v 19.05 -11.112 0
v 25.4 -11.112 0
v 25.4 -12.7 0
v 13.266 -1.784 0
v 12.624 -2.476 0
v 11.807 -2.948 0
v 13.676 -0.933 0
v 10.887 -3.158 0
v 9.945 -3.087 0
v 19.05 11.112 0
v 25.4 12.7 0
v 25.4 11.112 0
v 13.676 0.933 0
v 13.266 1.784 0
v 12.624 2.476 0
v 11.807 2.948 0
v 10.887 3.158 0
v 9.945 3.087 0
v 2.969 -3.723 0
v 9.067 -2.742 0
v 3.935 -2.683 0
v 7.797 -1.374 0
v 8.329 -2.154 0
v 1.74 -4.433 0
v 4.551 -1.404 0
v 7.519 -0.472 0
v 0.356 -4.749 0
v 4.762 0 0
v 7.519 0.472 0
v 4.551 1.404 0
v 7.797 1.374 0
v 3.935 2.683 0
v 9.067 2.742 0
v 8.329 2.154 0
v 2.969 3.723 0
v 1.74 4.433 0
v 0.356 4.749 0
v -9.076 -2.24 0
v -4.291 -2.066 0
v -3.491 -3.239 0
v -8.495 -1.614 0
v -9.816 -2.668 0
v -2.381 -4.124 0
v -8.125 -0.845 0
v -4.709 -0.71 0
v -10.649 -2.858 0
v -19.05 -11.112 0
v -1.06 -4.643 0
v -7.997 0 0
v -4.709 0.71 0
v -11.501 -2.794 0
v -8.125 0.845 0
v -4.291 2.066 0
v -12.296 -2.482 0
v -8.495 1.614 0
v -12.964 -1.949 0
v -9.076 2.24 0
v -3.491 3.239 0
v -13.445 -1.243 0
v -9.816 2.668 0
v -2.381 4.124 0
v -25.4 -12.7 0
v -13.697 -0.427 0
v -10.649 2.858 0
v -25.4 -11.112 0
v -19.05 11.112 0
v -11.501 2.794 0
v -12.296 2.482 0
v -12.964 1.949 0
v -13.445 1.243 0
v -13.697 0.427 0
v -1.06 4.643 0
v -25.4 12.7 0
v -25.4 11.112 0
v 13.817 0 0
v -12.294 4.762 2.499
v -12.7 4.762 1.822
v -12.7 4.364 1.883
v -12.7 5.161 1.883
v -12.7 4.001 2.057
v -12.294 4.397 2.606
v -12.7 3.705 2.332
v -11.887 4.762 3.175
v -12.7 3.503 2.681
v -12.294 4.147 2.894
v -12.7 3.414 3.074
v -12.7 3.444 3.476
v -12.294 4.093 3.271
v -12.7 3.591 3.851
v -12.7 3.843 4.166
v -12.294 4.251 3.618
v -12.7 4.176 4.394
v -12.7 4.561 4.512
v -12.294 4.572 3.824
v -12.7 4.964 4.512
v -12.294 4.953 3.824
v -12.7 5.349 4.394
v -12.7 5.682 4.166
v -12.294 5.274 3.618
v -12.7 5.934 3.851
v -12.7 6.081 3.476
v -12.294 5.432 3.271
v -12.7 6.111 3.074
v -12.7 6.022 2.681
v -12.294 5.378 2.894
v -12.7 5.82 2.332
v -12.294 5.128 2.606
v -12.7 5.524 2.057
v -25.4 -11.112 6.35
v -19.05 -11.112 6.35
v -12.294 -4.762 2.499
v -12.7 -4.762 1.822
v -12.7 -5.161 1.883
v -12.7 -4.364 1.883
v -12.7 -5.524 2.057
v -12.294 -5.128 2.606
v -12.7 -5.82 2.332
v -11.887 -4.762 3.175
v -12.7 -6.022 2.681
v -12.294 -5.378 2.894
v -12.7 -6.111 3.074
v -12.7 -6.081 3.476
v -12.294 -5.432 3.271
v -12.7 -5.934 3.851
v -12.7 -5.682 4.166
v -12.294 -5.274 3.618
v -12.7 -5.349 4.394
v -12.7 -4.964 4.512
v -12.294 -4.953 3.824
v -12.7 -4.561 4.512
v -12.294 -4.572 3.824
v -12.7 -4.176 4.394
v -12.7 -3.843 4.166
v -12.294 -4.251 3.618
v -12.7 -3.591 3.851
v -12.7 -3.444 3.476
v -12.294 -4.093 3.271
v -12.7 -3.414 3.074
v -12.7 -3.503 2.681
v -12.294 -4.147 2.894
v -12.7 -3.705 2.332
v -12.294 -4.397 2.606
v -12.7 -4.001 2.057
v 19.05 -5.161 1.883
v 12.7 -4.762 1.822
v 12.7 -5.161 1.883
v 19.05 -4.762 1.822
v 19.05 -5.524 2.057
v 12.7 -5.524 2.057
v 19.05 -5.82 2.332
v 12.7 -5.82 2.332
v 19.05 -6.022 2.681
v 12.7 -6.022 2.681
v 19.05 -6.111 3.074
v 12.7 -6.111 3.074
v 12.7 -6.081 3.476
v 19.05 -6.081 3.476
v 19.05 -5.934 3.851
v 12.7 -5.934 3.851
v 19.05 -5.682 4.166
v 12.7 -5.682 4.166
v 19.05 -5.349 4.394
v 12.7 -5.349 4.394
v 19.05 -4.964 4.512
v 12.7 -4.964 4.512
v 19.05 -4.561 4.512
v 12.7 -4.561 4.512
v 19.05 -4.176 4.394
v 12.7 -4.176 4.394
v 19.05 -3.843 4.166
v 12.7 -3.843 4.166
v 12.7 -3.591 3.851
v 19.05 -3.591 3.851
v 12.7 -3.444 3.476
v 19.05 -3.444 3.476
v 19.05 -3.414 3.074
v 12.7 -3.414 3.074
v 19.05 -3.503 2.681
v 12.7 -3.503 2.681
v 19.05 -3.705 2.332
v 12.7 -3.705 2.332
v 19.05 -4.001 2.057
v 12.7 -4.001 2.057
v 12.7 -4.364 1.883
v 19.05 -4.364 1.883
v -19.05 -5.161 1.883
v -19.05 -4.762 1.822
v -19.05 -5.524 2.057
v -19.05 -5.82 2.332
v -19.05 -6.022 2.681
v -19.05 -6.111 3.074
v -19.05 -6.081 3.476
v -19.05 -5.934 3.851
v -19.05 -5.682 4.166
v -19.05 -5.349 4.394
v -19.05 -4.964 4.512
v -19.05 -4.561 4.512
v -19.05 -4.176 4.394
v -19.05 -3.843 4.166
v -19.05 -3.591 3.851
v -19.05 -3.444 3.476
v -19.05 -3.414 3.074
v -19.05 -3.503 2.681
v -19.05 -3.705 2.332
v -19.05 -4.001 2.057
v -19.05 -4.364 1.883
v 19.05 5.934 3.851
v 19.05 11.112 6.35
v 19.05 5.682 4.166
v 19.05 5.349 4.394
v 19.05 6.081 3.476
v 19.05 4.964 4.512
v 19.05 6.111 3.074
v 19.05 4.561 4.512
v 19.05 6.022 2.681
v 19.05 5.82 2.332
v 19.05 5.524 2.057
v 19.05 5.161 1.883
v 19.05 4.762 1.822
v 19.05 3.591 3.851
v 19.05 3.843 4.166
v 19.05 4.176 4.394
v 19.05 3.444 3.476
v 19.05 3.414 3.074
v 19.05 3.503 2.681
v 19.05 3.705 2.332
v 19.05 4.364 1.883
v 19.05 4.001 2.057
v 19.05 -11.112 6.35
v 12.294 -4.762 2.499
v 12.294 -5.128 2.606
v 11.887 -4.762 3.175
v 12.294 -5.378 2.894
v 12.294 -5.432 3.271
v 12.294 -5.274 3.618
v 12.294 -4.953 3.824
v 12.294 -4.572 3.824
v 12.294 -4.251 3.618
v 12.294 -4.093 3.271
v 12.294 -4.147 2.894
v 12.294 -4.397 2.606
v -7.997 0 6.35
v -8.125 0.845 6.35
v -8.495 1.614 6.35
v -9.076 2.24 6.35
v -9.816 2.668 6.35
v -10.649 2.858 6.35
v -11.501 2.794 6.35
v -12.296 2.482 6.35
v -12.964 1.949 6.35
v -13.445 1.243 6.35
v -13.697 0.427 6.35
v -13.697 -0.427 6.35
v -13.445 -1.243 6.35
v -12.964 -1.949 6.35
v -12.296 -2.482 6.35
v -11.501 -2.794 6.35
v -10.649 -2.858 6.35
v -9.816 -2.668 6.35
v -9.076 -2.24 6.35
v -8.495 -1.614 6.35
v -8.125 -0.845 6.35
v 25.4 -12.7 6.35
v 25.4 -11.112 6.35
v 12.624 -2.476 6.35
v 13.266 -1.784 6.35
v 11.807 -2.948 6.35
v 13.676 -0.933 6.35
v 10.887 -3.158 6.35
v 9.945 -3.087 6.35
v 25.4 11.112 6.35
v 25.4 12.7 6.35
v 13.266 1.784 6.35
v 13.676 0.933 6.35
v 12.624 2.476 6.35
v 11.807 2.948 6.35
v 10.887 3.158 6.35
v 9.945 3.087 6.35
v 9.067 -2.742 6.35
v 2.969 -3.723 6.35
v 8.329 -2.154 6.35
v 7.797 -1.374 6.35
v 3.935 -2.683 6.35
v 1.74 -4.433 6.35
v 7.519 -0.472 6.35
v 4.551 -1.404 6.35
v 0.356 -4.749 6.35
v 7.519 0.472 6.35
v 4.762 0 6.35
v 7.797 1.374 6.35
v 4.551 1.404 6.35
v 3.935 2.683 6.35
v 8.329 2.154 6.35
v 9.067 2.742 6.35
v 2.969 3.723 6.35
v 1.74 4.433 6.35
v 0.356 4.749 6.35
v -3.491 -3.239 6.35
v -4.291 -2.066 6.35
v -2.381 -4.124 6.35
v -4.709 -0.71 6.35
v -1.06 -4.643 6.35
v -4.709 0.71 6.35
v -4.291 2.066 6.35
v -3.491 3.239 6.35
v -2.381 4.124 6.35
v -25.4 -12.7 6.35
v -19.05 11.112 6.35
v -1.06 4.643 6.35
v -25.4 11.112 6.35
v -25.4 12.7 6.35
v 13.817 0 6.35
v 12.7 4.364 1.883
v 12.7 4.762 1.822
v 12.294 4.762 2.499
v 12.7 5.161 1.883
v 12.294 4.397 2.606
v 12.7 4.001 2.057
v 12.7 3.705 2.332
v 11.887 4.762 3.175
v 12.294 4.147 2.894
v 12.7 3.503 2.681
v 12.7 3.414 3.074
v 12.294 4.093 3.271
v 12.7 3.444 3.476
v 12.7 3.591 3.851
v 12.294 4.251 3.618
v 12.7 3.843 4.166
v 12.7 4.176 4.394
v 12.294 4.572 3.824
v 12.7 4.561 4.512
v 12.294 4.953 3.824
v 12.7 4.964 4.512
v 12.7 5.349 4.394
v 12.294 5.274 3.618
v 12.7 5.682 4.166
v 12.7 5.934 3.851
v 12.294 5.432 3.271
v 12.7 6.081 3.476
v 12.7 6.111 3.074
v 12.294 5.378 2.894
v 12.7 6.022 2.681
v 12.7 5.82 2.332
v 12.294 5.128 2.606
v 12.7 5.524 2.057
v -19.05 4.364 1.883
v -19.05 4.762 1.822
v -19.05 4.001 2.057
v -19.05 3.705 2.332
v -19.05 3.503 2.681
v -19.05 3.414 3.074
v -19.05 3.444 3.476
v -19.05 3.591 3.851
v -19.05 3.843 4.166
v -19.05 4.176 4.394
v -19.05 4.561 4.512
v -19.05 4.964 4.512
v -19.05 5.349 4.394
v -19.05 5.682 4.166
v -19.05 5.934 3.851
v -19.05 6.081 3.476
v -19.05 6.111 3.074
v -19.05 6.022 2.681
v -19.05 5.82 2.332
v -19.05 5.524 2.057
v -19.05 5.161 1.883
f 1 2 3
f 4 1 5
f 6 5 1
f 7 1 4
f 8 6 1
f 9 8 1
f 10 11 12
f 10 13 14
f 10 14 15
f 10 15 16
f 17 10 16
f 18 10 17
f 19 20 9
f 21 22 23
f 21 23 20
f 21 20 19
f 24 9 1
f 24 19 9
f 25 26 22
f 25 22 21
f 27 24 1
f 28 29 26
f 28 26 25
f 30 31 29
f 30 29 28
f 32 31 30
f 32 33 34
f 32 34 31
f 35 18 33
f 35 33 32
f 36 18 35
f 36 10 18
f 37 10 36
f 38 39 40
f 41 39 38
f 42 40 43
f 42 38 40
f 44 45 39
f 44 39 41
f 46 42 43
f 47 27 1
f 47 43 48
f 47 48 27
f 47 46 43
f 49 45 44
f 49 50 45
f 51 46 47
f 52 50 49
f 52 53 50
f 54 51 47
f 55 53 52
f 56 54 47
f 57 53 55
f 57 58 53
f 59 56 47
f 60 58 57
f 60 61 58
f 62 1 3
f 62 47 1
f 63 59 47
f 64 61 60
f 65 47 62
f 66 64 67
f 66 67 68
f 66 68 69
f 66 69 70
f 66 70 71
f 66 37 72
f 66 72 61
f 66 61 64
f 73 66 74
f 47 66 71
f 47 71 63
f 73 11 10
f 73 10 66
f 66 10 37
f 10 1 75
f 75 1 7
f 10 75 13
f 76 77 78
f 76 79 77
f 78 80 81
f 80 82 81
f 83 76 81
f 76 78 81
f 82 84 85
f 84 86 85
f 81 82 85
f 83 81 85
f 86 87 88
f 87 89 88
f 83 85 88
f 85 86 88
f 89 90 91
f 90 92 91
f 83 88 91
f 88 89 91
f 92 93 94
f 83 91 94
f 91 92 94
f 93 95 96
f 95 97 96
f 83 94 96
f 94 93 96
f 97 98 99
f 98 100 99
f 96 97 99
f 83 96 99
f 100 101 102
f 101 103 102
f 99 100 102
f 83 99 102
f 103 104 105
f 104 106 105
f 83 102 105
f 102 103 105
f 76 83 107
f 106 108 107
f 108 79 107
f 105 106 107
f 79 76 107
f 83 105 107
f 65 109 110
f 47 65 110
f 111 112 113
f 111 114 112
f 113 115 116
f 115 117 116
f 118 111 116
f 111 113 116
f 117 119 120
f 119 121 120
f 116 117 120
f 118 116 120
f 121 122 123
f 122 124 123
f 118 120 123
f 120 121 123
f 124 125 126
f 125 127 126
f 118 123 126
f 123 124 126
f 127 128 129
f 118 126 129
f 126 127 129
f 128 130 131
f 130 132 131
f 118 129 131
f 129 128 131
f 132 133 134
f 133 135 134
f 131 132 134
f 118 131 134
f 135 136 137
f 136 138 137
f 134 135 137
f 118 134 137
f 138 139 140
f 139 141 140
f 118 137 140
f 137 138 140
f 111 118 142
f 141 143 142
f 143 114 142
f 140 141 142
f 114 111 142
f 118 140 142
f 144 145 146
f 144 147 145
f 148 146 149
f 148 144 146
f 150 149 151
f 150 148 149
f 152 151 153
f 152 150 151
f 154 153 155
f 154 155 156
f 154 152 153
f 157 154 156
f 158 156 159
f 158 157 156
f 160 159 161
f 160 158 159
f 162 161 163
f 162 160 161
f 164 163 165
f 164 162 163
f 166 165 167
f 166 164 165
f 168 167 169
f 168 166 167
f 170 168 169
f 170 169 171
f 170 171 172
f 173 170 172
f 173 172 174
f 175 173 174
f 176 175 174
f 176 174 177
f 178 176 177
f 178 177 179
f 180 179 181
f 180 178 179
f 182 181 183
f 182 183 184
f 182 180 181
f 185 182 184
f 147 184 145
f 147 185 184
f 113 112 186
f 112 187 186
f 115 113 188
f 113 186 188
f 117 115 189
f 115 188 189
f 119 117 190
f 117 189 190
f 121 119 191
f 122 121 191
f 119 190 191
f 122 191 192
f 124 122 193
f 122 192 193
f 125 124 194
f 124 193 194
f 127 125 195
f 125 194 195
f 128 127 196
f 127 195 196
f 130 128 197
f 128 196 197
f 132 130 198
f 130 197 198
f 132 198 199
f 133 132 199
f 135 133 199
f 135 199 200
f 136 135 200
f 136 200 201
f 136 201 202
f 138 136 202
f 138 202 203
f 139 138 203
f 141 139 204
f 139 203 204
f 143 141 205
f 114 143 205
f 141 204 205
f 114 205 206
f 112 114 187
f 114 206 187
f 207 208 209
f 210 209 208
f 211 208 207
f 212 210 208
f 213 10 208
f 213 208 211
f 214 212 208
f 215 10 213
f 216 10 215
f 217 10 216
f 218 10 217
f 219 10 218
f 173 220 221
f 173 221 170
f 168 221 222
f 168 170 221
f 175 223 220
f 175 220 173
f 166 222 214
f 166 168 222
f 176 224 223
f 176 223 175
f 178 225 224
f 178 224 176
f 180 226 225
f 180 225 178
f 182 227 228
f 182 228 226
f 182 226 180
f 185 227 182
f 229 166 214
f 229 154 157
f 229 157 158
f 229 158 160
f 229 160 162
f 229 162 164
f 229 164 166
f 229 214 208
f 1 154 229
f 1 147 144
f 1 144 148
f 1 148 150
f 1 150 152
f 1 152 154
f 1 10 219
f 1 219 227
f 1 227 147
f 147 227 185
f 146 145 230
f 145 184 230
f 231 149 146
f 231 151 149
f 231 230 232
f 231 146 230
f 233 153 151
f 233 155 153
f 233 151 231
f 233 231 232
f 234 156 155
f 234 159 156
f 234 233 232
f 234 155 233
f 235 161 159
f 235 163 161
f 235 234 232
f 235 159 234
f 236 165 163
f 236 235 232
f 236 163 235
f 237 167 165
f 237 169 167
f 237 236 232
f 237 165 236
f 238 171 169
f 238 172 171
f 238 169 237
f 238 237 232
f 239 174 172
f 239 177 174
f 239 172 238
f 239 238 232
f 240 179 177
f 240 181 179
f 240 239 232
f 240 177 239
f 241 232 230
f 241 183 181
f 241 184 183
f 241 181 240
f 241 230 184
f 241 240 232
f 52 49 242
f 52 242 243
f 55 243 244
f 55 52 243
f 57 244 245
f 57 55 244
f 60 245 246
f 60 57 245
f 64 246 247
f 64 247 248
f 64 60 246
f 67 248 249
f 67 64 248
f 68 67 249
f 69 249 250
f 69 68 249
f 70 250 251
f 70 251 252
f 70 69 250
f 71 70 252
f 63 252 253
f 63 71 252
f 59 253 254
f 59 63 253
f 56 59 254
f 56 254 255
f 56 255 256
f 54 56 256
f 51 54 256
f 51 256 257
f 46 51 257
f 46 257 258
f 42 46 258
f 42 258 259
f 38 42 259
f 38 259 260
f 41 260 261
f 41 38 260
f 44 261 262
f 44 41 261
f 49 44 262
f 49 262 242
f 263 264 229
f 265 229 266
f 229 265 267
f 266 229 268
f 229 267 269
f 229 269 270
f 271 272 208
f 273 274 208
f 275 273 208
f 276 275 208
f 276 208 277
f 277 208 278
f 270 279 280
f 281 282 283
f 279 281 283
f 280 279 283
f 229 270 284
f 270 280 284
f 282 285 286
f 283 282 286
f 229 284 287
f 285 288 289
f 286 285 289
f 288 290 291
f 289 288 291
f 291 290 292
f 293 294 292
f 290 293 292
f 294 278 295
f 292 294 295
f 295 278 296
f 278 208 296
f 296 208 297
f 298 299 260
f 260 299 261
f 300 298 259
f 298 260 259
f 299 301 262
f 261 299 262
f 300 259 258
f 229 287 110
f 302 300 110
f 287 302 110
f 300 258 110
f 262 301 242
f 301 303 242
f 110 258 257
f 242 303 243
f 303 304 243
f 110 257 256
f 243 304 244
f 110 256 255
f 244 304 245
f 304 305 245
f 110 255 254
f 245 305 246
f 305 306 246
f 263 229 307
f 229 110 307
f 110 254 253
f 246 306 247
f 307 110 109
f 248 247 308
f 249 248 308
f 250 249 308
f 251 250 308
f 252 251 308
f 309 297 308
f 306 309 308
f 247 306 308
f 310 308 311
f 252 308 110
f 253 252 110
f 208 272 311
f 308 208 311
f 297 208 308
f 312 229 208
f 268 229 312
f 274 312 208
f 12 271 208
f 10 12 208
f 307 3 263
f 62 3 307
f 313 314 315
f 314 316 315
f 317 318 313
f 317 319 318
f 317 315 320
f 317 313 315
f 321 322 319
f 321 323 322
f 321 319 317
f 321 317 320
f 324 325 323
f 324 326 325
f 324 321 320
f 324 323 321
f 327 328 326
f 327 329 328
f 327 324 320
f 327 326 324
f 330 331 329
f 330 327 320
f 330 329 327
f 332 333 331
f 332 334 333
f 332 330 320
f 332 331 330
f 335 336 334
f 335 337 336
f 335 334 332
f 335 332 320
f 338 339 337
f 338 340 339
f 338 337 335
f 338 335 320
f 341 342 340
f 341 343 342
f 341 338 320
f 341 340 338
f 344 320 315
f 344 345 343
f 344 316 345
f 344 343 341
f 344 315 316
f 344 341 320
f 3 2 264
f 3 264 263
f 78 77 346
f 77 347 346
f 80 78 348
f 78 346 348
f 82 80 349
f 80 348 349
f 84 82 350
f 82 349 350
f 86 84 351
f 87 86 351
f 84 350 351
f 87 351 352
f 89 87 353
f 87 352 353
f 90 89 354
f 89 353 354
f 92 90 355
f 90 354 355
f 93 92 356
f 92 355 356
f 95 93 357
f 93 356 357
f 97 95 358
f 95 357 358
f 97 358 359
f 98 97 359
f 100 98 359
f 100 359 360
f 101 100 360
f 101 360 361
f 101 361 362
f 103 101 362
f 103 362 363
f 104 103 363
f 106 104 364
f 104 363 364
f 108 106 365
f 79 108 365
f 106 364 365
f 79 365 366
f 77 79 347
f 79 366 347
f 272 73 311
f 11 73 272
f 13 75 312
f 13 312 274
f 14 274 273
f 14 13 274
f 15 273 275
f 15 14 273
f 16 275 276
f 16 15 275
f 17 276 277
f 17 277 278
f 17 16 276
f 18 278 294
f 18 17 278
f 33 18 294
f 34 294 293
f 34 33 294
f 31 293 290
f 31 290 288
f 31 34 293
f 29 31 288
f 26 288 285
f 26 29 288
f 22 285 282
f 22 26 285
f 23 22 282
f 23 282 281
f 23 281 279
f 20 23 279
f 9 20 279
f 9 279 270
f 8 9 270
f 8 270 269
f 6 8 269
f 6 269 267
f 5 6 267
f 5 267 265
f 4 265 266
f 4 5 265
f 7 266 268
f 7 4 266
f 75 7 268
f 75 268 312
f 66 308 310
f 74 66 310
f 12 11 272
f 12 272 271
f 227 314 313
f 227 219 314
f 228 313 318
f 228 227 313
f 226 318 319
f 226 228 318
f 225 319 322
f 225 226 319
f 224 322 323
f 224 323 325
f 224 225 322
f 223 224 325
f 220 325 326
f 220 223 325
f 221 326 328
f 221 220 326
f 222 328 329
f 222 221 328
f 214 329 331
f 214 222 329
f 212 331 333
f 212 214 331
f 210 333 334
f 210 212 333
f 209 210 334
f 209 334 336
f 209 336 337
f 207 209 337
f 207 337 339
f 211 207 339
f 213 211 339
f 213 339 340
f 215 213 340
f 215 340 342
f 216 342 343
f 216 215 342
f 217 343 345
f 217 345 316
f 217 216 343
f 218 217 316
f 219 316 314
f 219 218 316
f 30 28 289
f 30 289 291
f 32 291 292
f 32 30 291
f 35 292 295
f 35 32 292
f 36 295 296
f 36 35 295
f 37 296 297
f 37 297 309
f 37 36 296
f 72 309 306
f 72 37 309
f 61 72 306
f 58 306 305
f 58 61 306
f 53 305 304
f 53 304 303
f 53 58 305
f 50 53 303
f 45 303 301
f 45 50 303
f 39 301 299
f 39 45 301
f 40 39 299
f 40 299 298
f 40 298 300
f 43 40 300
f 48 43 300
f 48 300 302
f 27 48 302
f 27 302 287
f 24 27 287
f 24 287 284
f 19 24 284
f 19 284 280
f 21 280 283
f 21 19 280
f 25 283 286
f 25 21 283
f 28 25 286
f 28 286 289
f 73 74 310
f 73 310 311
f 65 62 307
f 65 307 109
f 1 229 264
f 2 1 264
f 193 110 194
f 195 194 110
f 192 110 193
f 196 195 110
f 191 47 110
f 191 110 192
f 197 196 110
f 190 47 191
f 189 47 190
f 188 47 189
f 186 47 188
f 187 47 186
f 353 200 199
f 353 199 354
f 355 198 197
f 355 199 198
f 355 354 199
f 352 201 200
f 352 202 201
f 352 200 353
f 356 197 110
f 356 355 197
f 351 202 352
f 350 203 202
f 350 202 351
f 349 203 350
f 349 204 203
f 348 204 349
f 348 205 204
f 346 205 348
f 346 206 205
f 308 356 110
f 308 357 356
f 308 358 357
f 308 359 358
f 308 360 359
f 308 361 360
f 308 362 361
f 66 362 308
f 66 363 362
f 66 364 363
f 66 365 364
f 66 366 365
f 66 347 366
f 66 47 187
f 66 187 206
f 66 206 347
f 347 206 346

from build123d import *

# Parameters (mm, degrees)
SKETCH1_R                          = 4.7625
SKETCH1_R_2                        = 2.86564839
SKETCH1_R_3                        = 3.16650189
BOSS_EXTRUDE1_DEPTH                = 6.35
TAP_DRILL_FOR_6_32_TAP1_AT_2_COUNT = 2
TAP_DRILL_FOR_6_32_TAP1_AT_2_PITCH = 9.525


with BuildPart() as part:
    # Sketch1 → Boss-Extrude1 (new body)
    with BuildSketch(Plane.XY):
        Polygon((25.4, -11.1125), (25.4, -12.7), (-25.4, -12.7), (-25.4, -11.1125), (-19.05, -11.1125), (-19.05, 11.1125), (-25.4, 11.1125), (-25.4, 12.7), (25.4, 12.7), (25.4, 11.1125), (19.05, 11.1125), (19.05, -11.1125), align=None)
        Circle(SKETCH1_R, mode=Mode.SUBTRACT)
        with Locations((-10.863100334, 0)):
            Circle(SKETCH1_R_2, mode=Mode.SUBTRACT)
        with Locations((10.650098366, 0)):
            Circle(SKETCH1_R_3, mode=Mode.SUBTRACT)
    extrude(amount=BOSS_EXTRUDE1_DEPTH)

    # Sketch4 → Tap Drill for #6-32 Tap1 (revolve, cut)
    with BuildSketch(Plane(origin=(19.05, 4.7625, 3.175), x_dir=(0, 0, -1), z_dir=(0, 1, 0))):
        Polygon((0, 0), (0, 7.16269403), (1.35255, 6.35), (1.35255, 0), align=None)
    tap_drill_for_6_32_tap1 = revolve(axis=Axis((25.4, 4.7625, 3.175), (-1, 0, 0)), mode=Mode.SUBTRACT)

    # Tap Drill for #6-32 Tap1 at 2: Tap Drill for #6-32 Tap1 ×2
    with Locations(*[(0, -i * TAP_DRILL_FOR_6_32_TAP1_AT_2_PITCH, 0) for i in range(1, TAP_DRILL_FOR_6_32_TAP1_AT_2_COUNT)]):
        add(tap_drill_for_6_32_tap1, mode=Mode.SUBTRACT)

    # Mirror1: Tap Drill for #6-32 Tap1 across plane
    add(tap_drill_for_6_32_tap1.mirror(Plane.ZY), mode=Mode.SUBTRACT)

    # Mirror1 copy 1 sketch → Mirror1 copy 1 (revolve, cut)
    with BuildSketch(Plane(origin=(-19.05, -4.7625, 3.175), x_dir=(0, 0, -1), z_dir=(0, 1, 0))):
        Polygon((0, 0), (0, -7.16269403), (1.35255, -6.35), (1.35255, 0), align=None)
    revolve(axis=Axis((-25.4, -4.7625, 3.175), (-1, 0, 0)), mode=Mode.SUBTRACT)


solid = part.part
